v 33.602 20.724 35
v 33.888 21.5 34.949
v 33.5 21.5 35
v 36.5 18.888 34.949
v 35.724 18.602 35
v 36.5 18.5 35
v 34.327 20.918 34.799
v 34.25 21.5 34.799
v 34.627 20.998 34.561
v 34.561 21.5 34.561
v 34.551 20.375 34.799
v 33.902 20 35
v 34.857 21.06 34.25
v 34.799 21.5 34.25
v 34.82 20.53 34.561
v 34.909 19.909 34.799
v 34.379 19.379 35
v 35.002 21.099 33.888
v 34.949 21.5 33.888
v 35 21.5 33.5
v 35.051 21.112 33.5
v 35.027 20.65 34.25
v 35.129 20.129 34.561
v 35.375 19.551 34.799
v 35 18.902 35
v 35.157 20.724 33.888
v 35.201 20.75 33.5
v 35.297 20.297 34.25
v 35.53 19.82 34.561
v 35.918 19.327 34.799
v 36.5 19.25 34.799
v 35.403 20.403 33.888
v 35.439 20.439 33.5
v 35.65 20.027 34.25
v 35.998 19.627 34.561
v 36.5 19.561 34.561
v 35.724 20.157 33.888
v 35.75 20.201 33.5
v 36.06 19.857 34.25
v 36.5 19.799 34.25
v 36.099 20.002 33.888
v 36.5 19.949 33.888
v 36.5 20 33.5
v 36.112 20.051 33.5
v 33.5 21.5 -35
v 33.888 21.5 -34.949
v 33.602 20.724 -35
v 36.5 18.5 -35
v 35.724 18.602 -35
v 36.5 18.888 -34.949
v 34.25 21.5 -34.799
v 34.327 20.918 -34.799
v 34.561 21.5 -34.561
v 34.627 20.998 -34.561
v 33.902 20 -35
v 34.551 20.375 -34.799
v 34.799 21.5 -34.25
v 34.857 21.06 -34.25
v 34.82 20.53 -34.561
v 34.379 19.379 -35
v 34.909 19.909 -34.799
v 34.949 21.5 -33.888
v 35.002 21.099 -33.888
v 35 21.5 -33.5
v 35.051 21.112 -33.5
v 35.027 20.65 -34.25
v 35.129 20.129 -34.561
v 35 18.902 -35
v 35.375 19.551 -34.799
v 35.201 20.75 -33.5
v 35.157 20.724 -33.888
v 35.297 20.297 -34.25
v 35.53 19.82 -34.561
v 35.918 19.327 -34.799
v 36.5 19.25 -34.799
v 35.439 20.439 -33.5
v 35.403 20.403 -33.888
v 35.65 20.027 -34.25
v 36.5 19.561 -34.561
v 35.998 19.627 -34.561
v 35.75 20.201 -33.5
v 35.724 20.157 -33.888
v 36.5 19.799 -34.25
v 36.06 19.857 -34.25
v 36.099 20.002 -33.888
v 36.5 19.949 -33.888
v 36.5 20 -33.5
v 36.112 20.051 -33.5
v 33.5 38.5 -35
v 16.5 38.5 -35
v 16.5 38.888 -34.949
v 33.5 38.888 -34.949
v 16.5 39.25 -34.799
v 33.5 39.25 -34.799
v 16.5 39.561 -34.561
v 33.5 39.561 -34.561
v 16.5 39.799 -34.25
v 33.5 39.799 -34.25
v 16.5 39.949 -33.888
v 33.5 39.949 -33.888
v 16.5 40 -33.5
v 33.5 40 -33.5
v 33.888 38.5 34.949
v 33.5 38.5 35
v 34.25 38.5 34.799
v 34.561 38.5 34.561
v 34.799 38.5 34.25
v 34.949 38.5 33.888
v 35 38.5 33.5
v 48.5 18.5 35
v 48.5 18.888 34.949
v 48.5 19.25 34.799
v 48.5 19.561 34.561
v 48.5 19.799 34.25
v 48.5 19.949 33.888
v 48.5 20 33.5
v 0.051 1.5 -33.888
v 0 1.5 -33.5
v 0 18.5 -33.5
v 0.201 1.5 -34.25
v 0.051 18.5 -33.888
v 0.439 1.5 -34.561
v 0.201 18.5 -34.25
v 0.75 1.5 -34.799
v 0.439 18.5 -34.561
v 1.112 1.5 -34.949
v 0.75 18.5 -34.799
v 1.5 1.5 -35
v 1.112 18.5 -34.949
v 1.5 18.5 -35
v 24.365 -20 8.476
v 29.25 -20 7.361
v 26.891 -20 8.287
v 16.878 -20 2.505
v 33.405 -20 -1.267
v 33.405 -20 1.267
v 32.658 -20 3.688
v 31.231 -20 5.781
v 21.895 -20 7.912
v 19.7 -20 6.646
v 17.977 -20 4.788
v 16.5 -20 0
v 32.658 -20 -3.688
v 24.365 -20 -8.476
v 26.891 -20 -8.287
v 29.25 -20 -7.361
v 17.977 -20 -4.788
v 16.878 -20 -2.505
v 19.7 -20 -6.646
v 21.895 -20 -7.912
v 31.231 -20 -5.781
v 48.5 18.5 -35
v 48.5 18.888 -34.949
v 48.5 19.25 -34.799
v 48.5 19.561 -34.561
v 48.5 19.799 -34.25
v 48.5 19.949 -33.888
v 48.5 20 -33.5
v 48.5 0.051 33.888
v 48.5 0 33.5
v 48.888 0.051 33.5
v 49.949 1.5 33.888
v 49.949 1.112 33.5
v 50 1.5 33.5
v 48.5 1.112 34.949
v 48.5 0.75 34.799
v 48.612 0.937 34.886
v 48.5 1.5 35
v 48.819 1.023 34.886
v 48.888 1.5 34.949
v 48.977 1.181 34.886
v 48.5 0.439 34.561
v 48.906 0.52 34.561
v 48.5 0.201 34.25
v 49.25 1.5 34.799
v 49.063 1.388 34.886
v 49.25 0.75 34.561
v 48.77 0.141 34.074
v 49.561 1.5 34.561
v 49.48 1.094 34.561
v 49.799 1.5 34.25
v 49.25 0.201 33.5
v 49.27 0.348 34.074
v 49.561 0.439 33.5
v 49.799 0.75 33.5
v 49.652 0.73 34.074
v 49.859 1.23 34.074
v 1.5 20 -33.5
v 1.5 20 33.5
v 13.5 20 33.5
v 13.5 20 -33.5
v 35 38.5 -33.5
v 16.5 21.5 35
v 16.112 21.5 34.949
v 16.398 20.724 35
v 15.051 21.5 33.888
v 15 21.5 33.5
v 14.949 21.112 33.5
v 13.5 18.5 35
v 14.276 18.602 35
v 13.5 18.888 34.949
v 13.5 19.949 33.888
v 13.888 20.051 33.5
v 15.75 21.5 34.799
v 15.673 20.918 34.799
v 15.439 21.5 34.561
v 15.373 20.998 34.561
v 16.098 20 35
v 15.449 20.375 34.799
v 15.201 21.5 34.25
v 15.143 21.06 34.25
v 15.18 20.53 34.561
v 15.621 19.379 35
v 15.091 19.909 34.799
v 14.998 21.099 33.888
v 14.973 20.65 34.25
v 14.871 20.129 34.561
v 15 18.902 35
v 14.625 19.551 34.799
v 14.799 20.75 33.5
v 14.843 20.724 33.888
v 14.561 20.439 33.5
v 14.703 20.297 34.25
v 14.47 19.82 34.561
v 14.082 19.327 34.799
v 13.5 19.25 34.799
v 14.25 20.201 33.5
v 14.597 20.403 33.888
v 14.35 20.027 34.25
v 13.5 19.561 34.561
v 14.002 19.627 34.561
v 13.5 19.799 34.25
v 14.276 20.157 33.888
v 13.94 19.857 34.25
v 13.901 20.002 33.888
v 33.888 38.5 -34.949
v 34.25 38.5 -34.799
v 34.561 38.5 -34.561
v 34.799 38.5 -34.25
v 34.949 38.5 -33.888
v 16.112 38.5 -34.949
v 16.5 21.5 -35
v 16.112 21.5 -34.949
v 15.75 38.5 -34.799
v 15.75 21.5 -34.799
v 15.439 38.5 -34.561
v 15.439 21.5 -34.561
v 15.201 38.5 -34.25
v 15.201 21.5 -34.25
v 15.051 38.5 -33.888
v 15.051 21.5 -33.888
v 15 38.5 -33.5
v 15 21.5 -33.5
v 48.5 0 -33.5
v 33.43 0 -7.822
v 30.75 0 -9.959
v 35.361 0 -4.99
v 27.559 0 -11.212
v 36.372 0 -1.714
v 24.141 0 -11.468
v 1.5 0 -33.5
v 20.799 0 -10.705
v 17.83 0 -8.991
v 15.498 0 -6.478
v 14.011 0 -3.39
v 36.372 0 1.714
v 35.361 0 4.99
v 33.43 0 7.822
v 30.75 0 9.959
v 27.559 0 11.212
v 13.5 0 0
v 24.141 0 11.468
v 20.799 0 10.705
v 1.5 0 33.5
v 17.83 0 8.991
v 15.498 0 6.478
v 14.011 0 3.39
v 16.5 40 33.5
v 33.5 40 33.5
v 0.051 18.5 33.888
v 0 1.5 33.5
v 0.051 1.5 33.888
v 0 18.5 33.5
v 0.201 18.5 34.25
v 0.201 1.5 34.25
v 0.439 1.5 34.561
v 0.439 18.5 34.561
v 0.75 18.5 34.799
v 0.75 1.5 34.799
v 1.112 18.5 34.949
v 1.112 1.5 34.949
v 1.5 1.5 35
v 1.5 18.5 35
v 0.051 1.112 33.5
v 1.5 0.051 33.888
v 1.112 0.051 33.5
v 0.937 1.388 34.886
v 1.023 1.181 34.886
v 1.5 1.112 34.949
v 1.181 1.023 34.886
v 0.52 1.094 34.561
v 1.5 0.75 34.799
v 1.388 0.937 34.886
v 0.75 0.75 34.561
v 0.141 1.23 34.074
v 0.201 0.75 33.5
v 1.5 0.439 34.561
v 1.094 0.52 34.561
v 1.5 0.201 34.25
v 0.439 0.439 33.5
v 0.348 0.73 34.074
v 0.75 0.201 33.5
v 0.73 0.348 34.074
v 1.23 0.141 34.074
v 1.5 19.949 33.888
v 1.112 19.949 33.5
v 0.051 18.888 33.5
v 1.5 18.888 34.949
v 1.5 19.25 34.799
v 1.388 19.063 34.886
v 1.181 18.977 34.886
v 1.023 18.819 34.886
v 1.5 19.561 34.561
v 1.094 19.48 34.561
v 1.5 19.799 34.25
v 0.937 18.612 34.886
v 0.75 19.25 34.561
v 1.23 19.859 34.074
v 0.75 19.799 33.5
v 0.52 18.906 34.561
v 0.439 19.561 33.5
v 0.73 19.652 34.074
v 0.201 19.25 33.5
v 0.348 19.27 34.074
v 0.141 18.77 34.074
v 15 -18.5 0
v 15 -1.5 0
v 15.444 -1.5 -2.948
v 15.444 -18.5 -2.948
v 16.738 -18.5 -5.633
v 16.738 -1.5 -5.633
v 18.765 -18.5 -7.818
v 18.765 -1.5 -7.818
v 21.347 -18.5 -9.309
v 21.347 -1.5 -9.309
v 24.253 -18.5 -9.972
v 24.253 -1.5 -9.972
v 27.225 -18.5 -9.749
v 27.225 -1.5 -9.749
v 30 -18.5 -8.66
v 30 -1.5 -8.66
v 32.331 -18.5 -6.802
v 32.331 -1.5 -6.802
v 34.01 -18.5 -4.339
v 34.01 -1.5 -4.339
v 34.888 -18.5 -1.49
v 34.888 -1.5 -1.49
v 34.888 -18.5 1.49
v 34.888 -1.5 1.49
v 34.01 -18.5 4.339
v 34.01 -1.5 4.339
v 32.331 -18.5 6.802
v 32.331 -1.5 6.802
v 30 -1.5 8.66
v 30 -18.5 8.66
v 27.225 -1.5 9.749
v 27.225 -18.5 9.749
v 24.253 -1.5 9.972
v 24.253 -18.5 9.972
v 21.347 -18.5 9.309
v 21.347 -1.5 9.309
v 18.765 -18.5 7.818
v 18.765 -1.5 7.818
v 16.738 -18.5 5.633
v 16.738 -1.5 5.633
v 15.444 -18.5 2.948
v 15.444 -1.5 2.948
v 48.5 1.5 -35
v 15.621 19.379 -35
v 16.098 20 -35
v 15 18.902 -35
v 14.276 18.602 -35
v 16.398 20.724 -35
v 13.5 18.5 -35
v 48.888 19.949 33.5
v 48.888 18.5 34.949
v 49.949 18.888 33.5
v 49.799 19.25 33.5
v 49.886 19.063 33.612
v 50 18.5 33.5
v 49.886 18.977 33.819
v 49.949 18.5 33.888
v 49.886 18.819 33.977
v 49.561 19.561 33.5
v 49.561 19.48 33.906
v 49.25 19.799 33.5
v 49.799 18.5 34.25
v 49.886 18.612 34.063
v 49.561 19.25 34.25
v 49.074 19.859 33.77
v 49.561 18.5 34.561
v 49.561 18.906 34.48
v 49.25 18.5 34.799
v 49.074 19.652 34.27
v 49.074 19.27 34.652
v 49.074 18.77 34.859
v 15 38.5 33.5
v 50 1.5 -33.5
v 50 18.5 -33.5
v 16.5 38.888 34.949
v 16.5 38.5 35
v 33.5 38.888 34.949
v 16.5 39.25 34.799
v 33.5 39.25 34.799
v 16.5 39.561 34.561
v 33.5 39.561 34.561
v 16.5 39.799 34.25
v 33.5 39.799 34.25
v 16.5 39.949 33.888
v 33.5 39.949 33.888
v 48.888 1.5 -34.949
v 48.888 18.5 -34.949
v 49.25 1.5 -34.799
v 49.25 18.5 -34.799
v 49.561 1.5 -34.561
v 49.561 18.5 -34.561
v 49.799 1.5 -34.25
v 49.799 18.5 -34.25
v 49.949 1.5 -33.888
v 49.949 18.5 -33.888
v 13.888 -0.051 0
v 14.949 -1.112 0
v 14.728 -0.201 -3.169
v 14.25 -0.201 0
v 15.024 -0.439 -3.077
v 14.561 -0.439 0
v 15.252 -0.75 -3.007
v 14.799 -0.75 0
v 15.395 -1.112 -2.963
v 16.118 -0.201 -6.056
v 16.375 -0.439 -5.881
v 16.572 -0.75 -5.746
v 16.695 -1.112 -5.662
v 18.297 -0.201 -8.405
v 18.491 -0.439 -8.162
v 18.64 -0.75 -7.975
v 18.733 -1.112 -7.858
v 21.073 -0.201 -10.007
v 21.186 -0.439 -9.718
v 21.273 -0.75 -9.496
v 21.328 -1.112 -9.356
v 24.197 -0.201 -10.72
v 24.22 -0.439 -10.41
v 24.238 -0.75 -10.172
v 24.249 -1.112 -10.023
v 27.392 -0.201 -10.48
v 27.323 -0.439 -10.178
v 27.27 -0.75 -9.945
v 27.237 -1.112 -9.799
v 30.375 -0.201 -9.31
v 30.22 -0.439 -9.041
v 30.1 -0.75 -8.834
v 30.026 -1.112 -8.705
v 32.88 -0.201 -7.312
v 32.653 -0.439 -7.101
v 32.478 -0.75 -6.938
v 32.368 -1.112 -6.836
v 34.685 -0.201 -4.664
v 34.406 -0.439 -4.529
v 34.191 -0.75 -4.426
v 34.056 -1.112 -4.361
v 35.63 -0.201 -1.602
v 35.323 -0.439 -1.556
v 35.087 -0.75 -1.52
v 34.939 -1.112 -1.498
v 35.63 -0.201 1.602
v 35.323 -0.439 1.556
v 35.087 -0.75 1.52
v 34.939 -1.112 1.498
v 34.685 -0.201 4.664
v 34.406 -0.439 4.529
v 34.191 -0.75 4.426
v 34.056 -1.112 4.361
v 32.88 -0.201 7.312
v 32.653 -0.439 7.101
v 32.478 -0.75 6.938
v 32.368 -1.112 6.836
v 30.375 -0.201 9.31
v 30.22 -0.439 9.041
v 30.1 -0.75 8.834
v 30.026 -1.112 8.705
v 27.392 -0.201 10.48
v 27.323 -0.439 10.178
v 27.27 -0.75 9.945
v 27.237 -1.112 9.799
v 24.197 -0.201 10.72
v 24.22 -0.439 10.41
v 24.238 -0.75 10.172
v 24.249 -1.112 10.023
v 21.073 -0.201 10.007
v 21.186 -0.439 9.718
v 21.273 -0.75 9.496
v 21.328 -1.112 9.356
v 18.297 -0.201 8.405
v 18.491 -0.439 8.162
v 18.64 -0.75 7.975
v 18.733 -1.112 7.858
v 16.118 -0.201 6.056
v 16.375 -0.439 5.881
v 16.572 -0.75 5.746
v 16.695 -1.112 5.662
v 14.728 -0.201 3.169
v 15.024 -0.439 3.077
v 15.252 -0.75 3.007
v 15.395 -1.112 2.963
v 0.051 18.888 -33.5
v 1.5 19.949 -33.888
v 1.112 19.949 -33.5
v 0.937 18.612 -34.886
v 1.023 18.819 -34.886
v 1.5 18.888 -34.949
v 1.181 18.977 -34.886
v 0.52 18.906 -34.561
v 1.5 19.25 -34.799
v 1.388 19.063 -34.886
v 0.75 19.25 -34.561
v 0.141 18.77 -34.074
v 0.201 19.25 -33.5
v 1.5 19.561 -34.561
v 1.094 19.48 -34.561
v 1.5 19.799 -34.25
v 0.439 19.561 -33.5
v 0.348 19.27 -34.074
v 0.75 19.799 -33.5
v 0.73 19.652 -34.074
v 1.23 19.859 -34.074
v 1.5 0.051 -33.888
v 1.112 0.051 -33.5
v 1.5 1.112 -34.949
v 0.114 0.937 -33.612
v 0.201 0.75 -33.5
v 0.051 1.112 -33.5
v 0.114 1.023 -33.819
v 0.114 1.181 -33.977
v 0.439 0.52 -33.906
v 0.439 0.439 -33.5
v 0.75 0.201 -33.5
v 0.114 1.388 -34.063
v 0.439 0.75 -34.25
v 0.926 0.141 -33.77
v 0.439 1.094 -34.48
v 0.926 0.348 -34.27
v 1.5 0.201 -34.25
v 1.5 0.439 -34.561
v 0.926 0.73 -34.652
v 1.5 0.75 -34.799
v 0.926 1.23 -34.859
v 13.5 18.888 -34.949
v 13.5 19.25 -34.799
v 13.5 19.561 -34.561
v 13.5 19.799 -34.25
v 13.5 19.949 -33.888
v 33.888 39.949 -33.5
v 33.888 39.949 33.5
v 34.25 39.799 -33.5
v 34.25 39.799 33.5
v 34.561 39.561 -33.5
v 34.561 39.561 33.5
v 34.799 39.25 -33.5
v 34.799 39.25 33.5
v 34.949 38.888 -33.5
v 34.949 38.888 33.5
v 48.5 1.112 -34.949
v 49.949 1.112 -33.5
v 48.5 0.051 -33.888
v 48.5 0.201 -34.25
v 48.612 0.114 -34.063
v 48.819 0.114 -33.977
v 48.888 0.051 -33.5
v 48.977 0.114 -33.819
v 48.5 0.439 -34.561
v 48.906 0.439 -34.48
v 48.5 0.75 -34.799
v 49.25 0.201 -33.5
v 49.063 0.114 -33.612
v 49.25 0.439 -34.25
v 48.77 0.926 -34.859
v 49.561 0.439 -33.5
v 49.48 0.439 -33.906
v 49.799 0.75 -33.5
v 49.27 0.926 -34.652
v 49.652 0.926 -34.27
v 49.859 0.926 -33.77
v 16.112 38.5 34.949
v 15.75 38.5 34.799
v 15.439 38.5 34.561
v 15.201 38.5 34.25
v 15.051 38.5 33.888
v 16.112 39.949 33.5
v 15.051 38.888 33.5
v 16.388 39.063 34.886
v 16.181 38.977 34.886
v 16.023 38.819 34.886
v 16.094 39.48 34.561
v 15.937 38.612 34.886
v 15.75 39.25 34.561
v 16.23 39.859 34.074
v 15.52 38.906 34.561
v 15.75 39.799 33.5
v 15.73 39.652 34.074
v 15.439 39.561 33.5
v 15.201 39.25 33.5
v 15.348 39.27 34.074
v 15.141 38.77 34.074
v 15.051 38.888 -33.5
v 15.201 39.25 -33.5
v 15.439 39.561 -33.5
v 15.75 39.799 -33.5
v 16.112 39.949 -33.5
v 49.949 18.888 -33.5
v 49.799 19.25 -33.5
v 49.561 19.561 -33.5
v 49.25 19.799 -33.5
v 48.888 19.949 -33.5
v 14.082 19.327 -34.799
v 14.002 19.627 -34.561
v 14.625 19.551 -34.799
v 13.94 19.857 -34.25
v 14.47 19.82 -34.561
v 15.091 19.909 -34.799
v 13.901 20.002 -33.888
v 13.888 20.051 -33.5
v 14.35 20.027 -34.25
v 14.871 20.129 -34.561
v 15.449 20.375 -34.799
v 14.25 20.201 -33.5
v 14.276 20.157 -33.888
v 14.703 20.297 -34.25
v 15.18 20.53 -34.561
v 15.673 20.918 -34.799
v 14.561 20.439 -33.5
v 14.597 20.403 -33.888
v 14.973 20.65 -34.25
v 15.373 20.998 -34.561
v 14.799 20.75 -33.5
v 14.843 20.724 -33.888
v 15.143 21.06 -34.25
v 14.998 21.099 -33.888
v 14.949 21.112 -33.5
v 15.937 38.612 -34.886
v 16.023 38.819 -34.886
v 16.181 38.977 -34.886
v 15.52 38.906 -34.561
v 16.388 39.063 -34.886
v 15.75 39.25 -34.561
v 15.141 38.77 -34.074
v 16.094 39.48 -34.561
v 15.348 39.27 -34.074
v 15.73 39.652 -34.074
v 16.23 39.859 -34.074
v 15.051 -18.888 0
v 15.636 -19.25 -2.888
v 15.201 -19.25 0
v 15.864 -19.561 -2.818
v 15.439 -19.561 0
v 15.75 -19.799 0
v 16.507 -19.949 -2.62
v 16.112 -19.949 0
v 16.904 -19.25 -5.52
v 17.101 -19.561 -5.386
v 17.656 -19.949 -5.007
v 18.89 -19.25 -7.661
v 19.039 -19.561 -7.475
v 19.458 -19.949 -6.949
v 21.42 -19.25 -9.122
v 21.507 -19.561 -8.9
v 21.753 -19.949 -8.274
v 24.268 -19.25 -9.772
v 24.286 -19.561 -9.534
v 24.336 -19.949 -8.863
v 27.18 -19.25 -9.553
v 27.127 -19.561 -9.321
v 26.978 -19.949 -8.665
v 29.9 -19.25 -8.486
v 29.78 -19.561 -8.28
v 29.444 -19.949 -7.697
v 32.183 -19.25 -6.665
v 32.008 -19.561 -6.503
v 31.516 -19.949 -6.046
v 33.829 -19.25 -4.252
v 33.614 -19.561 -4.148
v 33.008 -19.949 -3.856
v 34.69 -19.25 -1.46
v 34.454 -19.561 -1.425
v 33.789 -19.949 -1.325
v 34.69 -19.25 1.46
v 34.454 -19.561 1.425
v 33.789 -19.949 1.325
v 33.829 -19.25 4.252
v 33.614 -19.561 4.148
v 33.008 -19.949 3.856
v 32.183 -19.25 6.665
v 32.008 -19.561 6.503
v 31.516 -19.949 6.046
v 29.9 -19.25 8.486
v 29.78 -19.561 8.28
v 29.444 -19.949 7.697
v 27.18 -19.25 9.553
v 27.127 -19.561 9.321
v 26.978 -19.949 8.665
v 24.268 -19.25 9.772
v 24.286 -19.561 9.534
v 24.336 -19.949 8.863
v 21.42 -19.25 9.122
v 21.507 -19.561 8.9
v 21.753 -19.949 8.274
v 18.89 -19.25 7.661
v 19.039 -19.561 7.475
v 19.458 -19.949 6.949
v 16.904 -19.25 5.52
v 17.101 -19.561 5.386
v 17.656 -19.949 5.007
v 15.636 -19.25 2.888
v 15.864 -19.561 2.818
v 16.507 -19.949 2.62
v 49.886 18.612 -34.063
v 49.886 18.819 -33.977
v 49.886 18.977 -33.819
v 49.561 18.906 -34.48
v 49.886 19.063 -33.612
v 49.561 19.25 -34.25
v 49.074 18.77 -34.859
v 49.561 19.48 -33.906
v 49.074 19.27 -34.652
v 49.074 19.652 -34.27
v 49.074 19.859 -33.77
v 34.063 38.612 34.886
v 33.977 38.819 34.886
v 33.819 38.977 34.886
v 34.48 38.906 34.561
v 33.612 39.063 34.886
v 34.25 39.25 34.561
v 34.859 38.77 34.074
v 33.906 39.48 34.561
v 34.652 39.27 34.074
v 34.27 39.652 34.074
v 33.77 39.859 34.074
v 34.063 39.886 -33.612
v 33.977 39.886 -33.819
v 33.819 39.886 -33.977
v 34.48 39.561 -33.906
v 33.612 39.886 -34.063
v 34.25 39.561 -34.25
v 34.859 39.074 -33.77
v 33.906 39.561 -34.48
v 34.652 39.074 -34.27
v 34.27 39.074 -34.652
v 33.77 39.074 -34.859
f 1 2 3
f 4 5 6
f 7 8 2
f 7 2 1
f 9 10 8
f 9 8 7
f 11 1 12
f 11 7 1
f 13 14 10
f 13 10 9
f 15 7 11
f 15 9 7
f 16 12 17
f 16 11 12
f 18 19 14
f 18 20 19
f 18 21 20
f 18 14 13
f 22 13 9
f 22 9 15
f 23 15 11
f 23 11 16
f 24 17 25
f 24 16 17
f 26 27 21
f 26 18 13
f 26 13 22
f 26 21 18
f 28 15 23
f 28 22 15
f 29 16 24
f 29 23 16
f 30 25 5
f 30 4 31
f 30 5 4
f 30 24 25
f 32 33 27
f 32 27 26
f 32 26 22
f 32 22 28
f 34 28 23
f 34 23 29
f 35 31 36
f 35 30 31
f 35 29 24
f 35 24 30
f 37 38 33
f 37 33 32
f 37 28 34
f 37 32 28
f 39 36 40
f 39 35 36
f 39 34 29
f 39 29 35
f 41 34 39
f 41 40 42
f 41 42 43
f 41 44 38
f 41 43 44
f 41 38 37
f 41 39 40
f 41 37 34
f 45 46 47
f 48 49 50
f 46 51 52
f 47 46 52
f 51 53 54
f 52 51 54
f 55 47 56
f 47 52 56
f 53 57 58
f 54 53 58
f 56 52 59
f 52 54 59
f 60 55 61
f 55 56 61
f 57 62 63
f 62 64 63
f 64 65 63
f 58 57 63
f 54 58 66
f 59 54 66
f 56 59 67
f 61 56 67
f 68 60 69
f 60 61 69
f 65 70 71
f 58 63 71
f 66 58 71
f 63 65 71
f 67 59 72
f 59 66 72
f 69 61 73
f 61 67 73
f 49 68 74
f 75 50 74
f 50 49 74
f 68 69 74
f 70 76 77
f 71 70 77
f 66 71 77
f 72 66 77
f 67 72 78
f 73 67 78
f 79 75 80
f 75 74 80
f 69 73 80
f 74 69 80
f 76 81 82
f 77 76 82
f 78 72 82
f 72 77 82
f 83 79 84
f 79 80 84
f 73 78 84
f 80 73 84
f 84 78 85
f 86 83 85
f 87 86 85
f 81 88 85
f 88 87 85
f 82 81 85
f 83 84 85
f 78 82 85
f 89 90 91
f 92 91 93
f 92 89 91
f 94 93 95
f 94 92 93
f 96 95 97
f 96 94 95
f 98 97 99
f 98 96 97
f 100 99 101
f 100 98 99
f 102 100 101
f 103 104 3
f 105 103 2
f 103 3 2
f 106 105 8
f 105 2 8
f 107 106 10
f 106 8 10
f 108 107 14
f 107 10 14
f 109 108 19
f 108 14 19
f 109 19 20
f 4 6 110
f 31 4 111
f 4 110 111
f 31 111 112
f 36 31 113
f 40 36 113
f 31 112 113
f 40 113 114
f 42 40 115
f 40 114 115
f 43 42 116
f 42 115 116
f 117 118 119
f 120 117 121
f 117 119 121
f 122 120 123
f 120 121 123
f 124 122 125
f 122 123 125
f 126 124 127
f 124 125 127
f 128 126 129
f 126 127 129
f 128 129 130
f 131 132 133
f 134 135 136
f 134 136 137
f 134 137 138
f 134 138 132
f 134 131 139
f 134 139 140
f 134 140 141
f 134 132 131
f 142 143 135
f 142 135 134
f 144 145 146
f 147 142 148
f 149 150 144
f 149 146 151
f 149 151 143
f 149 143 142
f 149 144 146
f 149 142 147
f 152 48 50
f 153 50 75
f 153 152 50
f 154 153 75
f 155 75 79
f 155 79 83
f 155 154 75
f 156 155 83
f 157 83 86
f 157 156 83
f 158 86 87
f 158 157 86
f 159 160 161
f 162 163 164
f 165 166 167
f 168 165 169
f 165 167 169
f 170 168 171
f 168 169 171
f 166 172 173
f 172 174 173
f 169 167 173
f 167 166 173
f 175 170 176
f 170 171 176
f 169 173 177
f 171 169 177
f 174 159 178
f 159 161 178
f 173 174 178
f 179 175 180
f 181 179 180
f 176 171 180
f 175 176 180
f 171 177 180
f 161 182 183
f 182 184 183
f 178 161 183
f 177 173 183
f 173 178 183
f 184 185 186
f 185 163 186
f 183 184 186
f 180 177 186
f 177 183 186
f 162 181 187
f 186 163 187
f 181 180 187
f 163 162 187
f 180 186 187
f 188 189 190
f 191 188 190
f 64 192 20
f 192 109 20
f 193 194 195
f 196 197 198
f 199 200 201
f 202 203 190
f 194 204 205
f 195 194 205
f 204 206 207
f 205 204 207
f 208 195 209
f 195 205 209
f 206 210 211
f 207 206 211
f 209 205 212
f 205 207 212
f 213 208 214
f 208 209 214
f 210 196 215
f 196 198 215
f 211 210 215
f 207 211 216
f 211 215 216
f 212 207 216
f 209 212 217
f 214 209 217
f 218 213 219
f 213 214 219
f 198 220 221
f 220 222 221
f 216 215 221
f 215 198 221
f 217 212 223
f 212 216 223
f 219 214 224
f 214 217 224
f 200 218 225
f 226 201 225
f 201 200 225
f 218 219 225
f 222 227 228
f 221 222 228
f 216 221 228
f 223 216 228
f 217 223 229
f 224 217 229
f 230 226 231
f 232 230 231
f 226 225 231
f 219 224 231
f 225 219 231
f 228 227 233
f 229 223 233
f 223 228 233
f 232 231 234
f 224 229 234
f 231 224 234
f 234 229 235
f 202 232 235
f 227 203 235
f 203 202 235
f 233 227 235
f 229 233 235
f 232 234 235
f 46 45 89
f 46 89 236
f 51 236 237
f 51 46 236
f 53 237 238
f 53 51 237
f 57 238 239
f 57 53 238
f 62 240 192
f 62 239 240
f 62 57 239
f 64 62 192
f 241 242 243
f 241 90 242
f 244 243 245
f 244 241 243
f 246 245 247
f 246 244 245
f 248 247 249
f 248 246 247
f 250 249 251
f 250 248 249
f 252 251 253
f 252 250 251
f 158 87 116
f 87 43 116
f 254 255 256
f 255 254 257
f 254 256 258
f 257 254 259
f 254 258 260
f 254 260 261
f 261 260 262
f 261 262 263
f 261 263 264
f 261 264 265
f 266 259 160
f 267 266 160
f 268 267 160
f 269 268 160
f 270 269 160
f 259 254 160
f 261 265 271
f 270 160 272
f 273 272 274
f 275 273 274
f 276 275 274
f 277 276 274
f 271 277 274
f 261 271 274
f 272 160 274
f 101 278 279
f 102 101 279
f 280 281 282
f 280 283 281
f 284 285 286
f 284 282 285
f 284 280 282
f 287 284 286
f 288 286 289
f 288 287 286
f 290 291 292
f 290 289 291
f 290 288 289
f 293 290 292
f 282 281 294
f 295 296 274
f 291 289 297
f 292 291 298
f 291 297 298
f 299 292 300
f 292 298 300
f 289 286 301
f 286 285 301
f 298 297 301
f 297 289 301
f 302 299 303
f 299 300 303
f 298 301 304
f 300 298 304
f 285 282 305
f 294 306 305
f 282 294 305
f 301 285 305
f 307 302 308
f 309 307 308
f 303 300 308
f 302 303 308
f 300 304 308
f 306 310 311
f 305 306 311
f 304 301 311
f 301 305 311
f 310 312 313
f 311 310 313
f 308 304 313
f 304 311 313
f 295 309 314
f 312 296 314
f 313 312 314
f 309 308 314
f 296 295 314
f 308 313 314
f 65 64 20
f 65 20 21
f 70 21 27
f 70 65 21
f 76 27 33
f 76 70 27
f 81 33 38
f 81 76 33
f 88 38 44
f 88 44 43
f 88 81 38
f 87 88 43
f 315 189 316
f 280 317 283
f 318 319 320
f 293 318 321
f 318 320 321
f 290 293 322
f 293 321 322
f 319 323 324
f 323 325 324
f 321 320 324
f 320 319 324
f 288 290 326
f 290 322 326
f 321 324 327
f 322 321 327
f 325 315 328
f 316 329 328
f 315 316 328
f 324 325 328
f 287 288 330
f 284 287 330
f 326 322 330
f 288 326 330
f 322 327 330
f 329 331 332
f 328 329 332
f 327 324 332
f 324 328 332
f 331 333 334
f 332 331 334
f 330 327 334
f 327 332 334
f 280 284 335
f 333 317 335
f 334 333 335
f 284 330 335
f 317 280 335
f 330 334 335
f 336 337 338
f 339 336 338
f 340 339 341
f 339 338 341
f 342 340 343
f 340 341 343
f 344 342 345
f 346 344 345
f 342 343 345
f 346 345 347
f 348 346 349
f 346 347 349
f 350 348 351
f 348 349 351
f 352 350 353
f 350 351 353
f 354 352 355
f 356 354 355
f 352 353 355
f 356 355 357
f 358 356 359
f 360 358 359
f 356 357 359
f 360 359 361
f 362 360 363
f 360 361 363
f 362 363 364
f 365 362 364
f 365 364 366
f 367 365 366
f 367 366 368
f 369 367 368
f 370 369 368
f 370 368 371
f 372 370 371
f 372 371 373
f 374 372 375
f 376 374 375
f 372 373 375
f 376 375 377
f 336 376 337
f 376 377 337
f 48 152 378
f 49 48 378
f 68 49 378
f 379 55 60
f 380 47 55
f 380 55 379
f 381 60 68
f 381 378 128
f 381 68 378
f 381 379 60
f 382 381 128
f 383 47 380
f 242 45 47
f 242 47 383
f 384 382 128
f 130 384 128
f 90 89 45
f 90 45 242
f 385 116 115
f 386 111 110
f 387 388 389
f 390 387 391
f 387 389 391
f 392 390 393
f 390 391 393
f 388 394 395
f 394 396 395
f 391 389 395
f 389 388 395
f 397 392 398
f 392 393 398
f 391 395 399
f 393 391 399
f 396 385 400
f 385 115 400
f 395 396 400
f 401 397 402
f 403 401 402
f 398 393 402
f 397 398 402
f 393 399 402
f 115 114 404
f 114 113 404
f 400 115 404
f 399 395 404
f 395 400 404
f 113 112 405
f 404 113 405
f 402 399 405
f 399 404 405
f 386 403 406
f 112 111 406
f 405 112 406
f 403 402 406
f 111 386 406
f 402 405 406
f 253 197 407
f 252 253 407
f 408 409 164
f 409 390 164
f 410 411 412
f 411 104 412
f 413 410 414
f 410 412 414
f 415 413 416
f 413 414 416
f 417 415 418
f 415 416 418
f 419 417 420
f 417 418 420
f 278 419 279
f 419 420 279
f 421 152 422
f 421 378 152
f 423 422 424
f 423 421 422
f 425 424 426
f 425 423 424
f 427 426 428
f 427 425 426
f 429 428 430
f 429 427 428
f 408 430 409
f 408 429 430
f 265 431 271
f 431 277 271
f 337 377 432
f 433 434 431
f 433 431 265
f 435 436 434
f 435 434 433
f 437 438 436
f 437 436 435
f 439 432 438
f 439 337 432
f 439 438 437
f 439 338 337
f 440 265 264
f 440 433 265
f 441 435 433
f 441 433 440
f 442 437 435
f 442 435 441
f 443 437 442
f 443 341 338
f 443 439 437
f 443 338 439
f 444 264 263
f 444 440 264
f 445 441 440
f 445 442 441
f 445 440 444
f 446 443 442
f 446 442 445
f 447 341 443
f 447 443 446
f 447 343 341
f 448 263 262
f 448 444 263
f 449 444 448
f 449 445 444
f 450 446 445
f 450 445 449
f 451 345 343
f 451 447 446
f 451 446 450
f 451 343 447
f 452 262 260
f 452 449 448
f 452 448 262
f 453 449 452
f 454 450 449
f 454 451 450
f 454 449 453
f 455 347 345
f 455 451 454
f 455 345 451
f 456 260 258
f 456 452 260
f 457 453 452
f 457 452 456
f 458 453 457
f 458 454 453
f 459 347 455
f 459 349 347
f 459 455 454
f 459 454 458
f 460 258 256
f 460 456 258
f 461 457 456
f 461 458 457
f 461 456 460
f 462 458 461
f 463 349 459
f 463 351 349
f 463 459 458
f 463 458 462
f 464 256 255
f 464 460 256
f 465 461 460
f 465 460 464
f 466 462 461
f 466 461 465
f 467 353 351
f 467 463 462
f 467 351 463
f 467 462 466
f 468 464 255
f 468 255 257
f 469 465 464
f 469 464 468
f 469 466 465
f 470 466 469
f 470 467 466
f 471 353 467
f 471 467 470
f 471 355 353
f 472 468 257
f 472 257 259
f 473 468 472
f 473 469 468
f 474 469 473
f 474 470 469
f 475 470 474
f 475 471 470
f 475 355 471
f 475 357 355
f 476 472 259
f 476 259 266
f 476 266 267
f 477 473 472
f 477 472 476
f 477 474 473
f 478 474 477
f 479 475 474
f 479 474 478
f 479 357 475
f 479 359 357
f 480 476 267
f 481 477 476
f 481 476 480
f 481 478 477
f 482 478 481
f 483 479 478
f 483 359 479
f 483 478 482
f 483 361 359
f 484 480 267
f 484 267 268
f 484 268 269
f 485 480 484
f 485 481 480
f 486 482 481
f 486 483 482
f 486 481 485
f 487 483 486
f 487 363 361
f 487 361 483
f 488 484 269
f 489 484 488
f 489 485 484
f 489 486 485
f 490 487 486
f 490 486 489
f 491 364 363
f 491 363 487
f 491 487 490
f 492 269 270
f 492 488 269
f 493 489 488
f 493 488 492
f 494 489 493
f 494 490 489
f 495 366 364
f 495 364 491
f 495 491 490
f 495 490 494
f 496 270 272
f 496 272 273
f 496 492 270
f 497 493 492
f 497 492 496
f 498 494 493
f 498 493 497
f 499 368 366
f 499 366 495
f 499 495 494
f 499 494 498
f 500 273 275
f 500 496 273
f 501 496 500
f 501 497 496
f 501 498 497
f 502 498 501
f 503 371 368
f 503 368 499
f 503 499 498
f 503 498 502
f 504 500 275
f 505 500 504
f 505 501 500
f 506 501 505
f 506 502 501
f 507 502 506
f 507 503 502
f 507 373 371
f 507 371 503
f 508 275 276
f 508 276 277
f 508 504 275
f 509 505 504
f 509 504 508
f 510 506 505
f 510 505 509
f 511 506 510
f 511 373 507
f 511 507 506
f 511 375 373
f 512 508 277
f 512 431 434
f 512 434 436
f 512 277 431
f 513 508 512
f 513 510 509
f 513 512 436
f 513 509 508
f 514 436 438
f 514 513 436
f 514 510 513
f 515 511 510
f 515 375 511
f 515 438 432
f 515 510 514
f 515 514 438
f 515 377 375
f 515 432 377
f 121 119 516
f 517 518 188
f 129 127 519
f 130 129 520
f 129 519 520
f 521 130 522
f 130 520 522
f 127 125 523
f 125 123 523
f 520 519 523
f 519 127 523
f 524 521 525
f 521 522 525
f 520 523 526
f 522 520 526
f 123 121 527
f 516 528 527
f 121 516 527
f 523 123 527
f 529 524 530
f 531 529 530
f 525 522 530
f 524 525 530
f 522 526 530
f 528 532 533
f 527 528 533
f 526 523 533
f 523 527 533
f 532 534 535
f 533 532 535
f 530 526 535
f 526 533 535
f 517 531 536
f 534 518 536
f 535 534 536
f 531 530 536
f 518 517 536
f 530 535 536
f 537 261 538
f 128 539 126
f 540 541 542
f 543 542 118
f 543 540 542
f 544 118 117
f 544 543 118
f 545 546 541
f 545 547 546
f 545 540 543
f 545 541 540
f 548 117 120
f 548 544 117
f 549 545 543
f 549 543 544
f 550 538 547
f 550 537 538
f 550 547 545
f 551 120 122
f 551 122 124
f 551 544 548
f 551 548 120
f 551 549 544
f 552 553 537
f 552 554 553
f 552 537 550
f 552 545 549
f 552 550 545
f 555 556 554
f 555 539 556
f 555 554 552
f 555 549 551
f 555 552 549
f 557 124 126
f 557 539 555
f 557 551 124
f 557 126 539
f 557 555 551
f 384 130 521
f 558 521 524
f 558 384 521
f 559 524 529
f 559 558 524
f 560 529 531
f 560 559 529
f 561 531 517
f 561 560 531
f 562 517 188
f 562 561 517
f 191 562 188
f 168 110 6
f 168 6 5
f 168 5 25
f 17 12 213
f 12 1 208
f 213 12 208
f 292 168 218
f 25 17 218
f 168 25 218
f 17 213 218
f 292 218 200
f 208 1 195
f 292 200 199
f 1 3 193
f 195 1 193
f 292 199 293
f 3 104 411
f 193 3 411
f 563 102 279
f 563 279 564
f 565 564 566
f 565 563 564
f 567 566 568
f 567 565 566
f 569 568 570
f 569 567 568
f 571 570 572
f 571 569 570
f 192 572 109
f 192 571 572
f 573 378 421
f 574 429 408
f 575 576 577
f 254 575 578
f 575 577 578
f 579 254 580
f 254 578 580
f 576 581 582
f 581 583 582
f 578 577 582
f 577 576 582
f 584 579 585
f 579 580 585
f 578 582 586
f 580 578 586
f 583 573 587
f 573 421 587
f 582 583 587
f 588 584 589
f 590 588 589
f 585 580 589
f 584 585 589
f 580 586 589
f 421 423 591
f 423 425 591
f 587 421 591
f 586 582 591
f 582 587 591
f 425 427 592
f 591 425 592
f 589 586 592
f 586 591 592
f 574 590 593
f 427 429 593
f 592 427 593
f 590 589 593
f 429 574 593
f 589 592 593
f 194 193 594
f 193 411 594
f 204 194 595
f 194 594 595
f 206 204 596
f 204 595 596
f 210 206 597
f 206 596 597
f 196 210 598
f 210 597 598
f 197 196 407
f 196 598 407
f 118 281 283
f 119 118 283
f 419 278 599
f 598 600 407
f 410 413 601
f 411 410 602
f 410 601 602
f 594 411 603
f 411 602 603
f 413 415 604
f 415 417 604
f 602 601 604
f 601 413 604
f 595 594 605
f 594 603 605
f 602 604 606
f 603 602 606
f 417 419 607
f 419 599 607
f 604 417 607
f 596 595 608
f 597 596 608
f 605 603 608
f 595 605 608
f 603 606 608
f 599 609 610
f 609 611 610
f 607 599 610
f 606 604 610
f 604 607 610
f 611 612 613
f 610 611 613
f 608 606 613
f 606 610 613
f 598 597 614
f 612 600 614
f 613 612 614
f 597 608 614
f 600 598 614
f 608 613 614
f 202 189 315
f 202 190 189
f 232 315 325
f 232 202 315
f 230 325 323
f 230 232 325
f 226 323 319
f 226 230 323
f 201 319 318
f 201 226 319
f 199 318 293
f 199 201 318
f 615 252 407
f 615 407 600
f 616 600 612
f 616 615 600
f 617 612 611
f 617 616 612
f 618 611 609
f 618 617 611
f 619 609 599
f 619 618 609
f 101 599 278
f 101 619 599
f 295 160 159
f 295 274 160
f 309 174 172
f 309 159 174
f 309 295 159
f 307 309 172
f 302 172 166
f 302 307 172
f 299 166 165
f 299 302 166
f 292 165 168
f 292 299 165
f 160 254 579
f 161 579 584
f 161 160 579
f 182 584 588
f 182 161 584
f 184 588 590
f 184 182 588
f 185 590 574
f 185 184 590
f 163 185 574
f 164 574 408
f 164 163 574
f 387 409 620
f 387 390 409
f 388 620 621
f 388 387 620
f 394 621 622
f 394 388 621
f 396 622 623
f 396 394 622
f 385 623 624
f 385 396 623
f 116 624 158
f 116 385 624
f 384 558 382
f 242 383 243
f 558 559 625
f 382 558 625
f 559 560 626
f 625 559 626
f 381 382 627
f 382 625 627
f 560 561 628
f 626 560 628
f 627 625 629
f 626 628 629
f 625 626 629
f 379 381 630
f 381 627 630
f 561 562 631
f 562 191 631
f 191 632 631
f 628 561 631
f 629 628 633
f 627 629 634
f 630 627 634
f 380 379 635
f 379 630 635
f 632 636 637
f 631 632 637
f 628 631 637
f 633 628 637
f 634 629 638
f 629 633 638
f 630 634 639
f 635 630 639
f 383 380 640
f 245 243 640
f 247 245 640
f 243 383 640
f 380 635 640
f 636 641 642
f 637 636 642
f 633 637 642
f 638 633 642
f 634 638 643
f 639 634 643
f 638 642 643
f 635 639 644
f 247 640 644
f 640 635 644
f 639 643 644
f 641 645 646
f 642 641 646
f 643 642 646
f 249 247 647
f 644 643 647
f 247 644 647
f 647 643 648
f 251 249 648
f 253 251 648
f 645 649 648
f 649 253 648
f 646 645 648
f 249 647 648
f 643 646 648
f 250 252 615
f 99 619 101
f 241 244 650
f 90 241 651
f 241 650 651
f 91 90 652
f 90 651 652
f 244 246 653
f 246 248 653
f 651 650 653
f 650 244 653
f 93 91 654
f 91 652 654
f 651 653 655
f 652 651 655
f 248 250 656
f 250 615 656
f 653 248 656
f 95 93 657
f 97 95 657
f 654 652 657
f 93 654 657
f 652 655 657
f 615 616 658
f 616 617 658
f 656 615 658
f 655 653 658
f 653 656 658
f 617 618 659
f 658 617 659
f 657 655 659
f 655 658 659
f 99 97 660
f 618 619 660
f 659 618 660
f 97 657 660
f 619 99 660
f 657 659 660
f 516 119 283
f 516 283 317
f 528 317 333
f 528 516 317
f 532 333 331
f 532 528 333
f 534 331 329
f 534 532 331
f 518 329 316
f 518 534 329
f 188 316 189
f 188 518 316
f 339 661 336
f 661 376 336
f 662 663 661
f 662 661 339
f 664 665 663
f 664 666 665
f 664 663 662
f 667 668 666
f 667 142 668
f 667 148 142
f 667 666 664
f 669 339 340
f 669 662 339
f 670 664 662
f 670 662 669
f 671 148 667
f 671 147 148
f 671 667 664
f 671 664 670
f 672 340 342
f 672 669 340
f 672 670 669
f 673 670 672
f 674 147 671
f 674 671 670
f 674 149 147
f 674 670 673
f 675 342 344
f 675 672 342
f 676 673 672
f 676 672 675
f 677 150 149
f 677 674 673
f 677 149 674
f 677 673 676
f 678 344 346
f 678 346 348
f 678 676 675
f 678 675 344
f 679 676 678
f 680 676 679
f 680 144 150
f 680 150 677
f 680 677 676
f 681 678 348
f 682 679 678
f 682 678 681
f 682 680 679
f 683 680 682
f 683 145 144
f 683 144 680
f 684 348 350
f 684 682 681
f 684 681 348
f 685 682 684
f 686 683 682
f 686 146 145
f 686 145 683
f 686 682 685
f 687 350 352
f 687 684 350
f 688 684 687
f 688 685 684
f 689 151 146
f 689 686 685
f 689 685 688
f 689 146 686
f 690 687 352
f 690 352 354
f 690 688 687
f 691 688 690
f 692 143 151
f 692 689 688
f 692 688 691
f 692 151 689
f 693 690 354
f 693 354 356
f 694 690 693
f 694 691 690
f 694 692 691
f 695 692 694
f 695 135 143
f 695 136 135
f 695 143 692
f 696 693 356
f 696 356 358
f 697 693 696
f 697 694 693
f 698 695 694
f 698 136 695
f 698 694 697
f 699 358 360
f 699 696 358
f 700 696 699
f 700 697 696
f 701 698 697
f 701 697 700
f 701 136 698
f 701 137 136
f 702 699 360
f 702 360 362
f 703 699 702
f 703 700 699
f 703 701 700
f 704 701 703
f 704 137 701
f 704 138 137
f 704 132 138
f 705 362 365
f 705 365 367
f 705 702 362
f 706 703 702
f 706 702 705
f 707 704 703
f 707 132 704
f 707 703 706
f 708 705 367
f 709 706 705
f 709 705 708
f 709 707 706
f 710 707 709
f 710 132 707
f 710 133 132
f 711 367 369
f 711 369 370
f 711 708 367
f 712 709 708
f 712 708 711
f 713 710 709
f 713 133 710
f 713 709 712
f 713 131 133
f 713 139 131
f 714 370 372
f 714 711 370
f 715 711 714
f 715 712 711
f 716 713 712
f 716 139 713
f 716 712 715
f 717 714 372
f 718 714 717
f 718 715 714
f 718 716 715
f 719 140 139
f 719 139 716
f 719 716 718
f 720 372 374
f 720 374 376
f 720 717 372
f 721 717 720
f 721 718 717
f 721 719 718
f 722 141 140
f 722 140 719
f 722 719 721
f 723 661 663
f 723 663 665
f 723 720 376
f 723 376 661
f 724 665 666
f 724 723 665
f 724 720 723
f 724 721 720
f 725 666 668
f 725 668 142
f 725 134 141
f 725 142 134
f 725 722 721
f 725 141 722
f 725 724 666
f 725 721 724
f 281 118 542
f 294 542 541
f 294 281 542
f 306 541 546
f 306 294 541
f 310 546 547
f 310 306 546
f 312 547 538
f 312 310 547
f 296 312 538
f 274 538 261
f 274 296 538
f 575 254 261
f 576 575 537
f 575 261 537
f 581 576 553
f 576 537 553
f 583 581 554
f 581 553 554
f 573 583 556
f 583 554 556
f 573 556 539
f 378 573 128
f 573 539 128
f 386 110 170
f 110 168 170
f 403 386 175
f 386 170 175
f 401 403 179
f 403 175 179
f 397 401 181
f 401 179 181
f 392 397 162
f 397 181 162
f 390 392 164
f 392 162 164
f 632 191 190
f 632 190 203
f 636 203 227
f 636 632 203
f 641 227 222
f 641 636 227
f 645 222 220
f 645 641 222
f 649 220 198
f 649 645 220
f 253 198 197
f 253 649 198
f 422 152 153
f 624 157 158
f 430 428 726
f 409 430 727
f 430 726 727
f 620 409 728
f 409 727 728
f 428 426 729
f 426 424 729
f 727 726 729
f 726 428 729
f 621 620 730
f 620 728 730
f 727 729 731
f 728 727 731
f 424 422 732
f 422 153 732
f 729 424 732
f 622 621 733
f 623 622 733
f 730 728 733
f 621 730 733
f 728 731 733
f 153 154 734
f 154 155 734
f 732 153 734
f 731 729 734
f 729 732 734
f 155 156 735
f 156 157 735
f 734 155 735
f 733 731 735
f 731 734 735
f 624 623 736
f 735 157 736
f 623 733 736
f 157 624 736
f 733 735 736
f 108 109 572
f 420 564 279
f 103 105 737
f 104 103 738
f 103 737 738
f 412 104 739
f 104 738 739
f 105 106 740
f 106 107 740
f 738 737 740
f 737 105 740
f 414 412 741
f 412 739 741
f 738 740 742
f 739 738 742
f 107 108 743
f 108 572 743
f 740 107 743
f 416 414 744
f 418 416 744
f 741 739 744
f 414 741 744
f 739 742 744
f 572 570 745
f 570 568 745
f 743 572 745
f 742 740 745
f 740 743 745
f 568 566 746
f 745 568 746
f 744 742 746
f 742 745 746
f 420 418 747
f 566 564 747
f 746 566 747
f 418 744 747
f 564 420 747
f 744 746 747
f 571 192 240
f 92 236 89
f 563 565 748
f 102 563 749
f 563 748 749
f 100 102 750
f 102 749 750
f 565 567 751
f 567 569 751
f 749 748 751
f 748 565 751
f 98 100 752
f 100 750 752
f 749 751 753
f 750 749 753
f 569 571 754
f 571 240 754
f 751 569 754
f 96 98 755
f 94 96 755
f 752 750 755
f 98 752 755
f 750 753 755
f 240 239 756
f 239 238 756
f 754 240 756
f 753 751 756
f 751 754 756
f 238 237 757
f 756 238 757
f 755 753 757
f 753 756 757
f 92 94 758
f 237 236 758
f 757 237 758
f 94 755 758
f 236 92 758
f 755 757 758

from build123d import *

# Parameters (mm, degrees)
BOSS_EXTRUDE1_DEPTH = 35
SKETCH2_R           = 10
BOSS_EXTRUDE2_DEPTH = 20
FILLET1_R           = 1.5
FILLET2_R           = 1.5


with BuildPart() as part:
    # Sketch1 → Boss-Extrude1 (new body, symmetric)
    with BuildSketch(Plane.XY):
        Polygon((0, 0), (0, 20), (15, 20), (15, 40), (35, 40), (35, 20), (50, 20), (50, 0), align=None)
    extrude(amount=BOSS_EXTRUDE1_DEPTH, both=True)

    # Sketch2 → Boss-Extrude2 (add)
    with BuildSketch(Plane(origin=(0, 0, 0), x_dir=(-1, 0, 0), z_dir=(0, -1, 0))):
        with Locations((-25, 0)):
            Circle(SKETCH2_R)
    extrude(amount=BOSS_EXTRUDE2_DEPTH)

    # Fillet1
    fillet1_edges = [part.edges().sort_by_distance(p)[0] for p in [
        (35, 30, -35),
        (42.5, 20, -35),
        (50, 10, -35),
        (25, 0, -35),
        (42.5, 20, 35),
        (0, 0, 0),
        (0, 20, 0),
        (15, 20, 0),
        (15, 40, 0),
        (35, 40, 0),
        (35, 20, 0),
        (50, 20, 0),
        (50, 0, 0),
        (35, 30, 35),
        (25, 40, 35),
        (35, 0, 0),
        (15, 30, 35),
        (7.5, 20, 35),
        (0, 10, 35),
        (25, 0, 35),
        (0, 10, -35),
        (50, 10, 35),
        (7.5, 20, -35),
        (15, 30, -35),
        (25, 40, -35),
    ]]
    fillet(fillet1_edges, radius=FILLET1_R)

    # Fillet2
    fillet2_edges = [part.edges().sort_by_distance(p)[0] for p in [
        (35, -20, 0),
    ]]
    fillet(fillet2_edges, radius=FILLET2_R)


solid = part.part
